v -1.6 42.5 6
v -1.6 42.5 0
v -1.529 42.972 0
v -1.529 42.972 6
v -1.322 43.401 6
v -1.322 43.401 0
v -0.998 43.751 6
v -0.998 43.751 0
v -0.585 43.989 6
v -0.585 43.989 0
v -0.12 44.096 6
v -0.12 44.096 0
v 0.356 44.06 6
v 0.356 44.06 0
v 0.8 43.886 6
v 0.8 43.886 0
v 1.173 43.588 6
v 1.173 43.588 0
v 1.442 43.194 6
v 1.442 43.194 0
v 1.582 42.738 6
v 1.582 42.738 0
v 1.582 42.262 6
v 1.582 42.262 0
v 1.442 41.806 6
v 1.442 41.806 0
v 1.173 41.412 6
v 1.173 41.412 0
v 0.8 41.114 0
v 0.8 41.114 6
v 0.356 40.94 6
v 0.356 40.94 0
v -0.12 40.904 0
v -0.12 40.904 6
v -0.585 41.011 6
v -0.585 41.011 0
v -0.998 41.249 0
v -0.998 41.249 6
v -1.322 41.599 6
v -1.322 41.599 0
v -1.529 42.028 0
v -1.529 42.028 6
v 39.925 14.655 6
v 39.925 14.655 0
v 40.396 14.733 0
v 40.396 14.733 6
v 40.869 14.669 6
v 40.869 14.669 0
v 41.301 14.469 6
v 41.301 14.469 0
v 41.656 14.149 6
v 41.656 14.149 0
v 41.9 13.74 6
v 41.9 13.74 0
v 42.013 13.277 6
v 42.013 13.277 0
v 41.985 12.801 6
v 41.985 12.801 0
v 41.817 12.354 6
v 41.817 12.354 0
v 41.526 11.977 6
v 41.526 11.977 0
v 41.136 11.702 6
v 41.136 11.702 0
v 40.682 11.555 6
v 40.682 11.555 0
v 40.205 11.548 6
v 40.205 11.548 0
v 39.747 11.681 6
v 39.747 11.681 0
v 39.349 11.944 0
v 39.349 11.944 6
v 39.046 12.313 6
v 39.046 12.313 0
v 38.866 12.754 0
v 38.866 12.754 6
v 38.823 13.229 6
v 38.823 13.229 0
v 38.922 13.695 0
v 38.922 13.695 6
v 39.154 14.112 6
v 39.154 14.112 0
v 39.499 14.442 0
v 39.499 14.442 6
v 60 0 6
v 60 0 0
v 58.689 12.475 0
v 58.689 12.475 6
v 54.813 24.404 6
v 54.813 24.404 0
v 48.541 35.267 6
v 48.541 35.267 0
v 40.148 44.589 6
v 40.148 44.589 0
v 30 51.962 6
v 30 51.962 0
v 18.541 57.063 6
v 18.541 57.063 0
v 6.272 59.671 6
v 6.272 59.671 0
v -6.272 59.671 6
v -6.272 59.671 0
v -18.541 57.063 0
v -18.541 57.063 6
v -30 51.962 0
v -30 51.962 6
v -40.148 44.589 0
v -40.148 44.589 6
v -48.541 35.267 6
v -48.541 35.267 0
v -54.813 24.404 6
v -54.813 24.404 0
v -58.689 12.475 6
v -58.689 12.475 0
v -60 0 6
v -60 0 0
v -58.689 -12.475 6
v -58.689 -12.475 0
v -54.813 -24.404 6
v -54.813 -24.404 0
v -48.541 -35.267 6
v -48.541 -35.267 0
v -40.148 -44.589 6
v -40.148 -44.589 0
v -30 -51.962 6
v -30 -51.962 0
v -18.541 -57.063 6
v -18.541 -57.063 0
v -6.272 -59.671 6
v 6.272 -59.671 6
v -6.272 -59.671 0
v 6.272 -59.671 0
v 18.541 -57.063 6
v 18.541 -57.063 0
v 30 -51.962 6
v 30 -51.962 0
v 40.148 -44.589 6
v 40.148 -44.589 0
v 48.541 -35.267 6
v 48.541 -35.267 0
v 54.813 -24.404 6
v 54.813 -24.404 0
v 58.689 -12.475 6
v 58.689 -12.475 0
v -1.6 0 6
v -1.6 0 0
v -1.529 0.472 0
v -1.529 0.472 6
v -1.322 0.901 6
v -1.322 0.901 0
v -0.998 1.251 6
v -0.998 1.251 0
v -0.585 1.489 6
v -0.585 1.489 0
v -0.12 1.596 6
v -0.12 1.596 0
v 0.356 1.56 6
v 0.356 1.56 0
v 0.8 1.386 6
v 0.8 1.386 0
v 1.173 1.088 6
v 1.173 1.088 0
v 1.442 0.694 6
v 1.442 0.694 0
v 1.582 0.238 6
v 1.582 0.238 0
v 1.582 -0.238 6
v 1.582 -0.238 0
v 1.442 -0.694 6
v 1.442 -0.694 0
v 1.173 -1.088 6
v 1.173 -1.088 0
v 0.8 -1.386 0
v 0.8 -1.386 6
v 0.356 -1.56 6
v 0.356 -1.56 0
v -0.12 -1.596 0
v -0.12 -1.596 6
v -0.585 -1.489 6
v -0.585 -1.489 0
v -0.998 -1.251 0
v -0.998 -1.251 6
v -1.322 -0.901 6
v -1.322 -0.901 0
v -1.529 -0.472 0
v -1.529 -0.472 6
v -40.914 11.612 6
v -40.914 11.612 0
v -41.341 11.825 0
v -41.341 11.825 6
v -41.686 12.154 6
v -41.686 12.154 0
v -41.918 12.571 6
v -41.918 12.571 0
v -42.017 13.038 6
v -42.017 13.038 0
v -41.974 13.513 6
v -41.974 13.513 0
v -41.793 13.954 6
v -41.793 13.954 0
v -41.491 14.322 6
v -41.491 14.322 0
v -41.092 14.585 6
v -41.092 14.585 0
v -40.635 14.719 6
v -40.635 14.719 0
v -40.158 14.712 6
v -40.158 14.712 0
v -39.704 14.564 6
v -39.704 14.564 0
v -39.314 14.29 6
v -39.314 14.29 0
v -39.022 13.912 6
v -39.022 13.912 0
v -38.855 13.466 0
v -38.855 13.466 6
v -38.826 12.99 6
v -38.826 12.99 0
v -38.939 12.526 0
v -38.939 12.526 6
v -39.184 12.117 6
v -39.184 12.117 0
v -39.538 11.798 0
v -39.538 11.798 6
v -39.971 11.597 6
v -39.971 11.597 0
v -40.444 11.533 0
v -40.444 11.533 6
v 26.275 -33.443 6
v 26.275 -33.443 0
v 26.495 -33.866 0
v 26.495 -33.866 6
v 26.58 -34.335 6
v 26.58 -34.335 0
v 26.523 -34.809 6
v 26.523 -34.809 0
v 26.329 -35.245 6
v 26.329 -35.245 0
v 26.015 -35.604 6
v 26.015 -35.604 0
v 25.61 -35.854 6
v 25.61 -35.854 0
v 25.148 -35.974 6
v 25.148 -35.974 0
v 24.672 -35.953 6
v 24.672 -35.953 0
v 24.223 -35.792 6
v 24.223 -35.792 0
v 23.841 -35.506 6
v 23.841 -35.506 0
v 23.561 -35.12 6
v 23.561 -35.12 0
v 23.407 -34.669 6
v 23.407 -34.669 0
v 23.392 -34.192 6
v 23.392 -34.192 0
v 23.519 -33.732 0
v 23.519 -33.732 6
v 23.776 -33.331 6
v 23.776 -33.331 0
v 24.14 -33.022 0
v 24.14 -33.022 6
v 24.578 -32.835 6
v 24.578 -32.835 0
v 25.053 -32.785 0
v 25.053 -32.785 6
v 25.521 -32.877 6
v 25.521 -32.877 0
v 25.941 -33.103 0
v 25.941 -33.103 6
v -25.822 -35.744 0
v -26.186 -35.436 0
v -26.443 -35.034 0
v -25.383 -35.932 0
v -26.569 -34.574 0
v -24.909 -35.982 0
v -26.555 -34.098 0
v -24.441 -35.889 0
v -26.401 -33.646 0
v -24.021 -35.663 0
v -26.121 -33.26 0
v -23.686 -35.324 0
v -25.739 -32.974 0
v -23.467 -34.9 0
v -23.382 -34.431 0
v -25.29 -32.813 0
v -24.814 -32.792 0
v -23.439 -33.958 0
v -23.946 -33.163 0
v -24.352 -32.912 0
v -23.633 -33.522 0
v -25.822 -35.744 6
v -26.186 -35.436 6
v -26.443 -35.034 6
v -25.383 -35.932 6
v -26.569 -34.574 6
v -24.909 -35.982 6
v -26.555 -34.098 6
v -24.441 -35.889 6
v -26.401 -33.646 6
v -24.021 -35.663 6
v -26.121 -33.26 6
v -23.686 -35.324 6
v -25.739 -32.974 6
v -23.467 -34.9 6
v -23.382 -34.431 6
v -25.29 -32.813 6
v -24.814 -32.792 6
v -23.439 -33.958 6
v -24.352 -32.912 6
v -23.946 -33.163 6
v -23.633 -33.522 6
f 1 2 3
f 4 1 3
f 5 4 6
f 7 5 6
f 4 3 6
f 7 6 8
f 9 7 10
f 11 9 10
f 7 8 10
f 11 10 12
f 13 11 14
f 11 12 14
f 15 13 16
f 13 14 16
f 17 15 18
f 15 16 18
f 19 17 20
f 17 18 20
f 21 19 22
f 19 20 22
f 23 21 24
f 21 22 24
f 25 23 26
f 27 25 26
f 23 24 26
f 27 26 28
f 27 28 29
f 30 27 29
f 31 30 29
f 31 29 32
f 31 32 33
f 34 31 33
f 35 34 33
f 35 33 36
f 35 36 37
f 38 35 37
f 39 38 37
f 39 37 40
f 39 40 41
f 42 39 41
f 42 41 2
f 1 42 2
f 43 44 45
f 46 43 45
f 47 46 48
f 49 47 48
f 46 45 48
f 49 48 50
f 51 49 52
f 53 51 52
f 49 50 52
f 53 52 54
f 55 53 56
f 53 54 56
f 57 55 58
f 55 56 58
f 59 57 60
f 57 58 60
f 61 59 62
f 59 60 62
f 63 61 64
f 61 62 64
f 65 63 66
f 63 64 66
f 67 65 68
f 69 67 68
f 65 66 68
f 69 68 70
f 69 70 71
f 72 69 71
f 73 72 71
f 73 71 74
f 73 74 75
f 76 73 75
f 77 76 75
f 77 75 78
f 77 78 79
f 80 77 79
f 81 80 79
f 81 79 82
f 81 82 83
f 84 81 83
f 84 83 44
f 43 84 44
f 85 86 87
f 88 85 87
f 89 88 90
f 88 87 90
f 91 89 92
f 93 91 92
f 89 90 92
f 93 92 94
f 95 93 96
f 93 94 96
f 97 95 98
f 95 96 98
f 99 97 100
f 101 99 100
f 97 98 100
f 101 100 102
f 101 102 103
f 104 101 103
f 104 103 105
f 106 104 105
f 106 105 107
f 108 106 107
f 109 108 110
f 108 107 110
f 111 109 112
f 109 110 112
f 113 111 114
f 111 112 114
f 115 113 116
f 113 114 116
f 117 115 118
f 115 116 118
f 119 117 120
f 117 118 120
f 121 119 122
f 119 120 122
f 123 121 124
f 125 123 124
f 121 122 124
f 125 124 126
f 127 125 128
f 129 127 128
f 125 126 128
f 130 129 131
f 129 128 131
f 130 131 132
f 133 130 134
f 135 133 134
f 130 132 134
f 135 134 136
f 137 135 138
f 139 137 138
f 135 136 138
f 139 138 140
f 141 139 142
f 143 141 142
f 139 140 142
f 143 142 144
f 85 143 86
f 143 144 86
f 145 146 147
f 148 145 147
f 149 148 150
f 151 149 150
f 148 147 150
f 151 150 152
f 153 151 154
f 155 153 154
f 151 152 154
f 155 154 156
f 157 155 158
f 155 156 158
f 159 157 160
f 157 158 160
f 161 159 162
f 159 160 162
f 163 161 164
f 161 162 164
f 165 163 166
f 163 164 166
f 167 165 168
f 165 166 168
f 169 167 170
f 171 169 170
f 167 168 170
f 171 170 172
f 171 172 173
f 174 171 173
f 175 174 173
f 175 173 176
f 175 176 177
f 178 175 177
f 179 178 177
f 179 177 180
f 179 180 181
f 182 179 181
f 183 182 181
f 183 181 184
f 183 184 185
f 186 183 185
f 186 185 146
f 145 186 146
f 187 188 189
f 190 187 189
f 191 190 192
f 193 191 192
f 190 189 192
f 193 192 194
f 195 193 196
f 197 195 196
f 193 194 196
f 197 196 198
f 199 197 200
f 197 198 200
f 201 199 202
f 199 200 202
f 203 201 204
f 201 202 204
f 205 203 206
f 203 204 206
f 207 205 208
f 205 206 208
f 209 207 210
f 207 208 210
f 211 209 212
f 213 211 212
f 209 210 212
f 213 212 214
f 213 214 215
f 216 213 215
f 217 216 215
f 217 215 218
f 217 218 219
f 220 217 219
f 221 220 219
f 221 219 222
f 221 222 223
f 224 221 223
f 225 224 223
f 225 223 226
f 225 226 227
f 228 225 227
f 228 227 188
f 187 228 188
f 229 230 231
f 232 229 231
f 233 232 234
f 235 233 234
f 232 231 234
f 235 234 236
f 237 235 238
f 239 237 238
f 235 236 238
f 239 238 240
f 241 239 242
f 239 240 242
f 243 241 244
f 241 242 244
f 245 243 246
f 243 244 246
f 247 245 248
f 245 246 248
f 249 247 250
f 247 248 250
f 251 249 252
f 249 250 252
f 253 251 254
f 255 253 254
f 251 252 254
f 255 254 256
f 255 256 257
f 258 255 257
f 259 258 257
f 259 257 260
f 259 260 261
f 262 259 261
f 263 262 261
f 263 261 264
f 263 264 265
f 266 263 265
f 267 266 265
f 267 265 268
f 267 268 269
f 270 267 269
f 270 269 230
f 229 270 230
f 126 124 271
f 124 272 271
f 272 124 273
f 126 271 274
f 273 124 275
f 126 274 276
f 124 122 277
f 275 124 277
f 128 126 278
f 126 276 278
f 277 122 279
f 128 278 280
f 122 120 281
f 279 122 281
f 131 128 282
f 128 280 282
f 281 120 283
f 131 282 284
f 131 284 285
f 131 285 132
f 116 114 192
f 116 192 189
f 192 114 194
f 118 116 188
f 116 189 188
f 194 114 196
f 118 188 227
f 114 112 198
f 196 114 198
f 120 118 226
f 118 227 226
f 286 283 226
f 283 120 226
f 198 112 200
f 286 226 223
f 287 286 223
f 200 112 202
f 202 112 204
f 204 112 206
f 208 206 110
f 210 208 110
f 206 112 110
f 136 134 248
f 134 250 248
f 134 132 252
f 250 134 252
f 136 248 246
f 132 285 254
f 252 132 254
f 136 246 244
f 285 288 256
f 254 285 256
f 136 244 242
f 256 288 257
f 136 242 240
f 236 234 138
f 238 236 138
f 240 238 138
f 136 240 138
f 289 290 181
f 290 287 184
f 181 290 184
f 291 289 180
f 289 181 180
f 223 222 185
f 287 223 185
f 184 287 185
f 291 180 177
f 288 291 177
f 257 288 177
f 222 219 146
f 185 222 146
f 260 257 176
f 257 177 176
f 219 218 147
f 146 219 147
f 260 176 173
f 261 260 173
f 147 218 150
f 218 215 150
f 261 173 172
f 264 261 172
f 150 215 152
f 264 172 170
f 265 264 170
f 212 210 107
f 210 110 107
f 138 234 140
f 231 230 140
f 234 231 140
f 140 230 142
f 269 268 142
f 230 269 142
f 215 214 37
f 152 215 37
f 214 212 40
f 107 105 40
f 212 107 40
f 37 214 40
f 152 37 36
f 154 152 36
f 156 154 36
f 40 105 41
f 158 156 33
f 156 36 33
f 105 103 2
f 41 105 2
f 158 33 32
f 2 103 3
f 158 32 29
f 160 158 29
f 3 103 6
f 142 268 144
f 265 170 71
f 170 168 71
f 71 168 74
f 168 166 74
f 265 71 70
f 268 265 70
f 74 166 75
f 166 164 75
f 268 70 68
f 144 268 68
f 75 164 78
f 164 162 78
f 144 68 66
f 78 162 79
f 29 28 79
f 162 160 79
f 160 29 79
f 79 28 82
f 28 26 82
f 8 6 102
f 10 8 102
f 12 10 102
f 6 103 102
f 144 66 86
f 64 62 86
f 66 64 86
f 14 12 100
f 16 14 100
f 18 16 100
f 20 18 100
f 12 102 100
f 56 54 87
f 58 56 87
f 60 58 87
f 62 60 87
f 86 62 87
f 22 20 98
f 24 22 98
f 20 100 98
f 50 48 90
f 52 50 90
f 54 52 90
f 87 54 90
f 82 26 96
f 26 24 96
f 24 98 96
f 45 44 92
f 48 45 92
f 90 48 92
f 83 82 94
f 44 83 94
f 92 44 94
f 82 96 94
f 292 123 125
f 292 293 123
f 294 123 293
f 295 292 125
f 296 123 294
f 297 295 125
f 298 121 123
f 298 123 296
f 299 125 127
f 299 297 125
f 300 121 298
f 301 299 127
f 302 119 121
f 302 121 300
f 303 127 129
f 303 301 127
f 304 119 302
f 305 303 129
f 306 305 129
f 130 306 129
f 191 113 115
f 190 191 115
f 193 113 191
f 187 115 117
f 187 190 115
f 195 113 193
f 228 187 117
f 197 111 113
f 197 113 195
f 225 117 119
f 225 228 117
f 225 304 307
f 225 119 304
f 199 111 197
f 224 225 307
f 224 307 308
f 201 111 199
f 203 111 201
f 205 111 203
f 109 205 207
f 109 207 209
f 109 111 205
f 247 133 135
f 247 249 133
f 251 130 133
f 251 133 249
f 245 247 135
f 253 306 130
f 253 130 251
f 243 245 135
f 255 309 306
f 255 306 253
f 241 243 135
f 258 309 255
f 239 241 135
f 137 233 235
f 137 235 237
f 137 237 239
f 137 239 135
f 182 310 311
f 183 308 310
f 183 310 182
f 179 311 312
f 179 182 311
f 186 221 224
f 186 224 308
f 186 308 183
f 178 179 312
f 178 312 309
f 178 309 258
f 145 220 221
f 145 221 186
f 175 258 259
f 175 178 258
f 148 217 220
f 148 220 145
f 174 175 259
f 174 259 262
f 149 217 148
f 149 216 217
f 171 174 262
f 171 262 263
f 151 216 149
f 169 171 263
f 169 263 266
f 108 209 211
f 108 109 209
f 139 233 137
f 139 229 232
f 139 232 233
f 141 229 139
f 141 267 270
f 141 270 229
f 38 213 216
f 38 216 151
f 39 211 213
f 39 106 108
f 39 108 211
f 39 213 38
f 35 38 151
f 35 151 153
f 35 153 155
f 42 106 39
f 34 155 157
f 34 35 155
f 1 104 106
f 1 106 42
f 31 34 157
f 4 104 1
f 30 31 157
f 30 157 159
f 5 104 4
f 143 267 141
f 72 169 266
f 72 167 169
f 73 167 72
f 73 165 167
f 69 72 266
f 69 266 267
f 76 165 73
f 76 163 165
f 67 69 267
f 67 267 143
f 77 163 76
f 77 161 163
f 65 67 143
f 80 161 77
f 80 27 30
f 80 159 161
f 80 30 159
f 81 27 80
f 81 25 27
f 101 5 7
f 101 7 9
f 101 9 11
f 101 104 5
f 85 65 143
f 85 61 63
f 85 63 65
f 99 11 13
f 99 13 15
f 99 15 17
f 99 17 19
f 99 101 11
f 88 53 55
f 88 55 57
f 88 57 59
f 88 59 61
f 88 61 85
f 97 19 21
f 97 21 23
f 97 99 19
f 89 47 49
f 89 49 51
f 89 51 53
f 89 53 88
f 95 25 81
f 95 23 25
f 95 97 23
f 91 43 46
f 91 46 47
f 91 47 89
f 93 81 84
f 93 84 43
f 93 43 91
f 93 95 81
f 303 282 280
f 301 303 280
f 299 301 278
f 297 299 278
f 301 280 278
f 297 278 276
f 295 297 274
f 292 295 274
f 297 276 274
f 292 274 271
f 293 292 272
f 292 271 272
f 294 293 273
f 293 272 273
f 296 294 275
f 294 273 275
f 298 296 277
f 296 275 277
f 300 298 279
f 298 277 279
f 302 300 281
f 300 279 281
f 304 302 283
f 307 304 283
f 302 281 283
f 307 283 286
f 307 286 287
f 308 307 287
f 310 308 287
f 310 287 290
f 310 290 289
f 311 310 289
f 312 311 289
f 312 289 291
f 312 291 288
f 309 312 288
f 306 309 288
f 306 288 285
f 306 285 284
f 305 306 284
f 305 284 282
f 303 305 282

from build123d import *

# Parameters (mm, degrees)
F0_R            = 60
F1_DEPTH        = 6
F3_D            = 3.2
F6_D            = 3.2
F6_COPIES_COUNT = 5


# Not quite as in the source:
# - a pattern or mirror of a feature is missing from the dataset's text; its kind, count and spacing are read off the source's solid


with BuildPart() as f1:
    # F0 (on Top) → F1 (new body)
    with BuildSketch(Plane.XY):
        Circle(F0_R)
    extrude(amount=F1_DEPTH)

    # F3 (through all)
    with Locations(Plane.XY.offset(6)):
        with Locations((0, 0)):
            Hole(F3_D / 2)

    # F6 (through all)
    with Locations(Plane.XY.offset(6)):
        with Locations((0, 42.5)):
            f6 = Hole(F6_D / 2)

    # F6_copies: F6 ×5 about axis
    f6_copies_axis = Axis((0, 0, 0), (0, 0, 1))
    for i in range(1, F6_COPIES_COUNT):
        add(f6.rotate(f6_copies_axis, i * 360 / F6_COPIES_COUNT), mode=Mode.SUBTRACT)


solid = f1.part
